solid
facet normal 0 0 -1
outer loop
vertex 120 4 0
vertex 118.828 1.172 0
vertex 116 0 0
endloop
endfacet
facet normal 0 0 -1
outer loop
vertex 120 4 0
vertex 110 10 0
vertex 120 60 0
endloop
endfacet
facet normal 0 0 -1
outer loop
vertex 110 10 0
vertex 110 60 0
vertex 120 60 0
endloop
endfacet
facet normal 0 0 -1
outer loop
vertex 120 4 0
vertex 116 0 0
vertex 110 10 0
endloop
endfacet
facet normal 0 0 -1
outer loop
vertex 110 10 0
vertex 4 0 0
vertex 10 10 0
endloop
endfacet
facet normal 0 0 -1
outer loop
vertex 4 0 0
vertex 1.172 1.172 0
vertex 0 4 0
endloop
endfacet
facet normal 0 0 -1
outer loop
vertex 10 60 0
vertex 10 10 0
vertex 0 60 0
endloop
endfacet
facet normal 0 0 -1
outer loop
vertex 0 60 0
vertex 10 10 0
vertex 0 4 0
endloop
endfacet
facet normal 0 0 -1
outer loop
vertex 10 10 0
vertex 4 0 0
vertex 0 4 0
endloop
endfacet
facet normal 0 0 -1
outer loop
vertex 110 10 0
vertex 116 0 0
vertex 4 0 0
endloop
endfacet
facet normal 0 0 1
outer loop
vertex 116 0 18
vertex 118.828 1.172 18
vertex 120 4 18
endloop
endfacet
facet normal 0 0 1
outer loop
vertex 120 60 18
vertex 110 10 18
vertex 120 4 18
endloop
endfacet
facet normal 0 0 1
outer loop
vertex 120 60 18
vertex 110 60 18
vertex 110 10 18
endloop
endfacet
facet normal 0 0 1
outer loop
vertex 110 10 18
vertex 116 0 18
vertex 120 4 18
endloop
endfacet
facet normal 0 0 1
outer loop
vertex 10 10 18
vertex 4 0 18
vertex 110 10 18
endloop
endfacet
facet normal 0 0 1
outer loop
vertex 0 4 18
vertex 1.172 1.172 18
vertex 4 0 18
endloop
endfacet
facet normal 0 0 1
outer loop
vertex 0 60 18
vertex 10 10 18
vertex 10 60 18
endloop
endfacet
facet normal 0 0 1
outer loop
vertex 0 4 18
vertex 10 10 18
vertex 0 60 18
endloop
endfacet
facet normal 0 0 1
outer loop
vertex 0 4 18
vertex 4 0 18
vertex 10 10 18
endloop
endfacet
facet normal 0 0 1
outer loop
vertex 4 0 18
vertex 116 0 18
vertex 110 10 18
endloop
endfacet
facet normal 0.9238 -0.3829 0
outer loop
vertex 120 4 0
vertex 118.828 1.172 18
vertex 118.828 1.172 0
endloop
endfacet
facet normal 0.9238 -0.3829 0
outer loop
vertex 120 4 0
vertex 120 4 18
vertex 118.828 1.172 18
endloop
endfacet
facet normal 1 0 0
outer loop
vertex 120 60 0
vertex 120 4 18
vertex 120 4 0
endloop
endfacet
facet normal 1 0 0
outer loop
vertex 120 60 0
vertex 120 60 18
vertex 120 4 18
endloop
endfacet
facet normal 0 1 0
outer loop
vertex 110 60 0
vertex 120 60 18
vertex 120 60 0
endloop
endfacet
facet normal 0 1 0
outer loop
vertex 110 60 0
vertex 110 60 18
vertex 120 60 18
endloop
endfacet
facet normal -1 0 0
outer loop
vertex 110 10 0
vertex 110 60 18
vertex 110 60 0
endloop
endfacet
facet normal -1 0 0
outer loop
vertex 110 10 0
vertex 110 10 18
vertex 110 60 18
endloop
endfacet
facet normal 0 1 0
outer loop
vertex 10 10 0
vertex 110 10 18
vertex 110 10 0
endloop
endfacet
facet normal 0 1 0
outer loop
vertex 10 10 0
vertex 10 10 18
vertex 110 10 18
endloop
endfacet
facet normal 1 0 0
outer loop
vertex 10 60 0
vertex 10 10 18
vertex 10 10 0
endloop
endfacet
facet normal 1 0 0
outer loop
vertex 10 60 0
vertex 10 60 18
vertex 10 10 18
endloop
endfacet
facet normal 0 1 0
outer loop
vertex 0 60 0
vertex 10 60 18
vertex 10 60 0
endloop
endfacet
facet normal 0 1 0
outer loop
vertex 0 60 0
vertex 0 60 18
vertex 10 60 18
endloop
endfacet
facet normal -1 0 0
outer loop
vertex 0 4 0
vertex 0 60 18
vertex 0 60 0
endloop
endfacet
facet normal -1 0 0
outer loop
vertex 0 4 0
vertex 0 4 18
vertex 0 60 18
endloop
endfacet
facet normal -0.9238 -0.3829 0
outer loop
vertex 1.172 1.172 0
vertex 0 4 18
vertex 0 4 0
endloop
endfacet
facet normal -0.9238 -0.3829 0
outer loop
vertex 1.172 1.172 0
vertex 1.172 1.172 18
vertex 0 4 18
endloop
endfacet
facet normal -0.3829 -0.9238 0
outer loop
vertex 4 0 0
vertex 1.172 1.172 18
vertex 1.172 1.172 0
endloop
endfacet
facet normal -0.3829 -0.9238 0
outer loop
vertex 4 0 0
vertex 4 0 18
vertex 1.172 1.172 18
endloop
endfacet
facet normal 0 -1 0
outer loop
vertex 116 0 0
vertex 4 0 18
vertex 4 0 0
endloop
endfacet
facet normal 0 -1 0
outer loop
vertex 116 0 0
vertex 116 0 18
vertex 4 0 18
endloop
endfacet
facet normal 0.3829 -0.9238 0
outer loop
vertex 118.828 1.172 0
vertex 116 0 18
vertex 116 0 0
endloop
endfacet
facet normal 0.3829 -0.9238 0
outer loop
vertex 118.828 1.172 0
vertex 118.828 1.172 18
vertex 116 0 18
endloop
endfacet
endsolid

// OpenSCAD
$fn = 32;

// ----------------------------------------------------------------------
// Heat sink frame: 120 x 60 mm frame, 10 mm walls
// ----------------------------------------------------------------------

// --- parameters (mm) ---
profile_height = 18;      // extrusion height
profile_points = 12;      // points of the closed outline

profile = [[0, 4], [1.172, 1.172], [4, 0], [116, 0], [118.828, 1.172], [120, 4], [120, 60], [110, 60], [110, 10], [10, 10], [10, 60], [0, 60]];  // single closed polygon, 12 points, counter clockwise

// --- the one profile operation ---
linear_extrude(height = profile_height) polygon(points = profile);
